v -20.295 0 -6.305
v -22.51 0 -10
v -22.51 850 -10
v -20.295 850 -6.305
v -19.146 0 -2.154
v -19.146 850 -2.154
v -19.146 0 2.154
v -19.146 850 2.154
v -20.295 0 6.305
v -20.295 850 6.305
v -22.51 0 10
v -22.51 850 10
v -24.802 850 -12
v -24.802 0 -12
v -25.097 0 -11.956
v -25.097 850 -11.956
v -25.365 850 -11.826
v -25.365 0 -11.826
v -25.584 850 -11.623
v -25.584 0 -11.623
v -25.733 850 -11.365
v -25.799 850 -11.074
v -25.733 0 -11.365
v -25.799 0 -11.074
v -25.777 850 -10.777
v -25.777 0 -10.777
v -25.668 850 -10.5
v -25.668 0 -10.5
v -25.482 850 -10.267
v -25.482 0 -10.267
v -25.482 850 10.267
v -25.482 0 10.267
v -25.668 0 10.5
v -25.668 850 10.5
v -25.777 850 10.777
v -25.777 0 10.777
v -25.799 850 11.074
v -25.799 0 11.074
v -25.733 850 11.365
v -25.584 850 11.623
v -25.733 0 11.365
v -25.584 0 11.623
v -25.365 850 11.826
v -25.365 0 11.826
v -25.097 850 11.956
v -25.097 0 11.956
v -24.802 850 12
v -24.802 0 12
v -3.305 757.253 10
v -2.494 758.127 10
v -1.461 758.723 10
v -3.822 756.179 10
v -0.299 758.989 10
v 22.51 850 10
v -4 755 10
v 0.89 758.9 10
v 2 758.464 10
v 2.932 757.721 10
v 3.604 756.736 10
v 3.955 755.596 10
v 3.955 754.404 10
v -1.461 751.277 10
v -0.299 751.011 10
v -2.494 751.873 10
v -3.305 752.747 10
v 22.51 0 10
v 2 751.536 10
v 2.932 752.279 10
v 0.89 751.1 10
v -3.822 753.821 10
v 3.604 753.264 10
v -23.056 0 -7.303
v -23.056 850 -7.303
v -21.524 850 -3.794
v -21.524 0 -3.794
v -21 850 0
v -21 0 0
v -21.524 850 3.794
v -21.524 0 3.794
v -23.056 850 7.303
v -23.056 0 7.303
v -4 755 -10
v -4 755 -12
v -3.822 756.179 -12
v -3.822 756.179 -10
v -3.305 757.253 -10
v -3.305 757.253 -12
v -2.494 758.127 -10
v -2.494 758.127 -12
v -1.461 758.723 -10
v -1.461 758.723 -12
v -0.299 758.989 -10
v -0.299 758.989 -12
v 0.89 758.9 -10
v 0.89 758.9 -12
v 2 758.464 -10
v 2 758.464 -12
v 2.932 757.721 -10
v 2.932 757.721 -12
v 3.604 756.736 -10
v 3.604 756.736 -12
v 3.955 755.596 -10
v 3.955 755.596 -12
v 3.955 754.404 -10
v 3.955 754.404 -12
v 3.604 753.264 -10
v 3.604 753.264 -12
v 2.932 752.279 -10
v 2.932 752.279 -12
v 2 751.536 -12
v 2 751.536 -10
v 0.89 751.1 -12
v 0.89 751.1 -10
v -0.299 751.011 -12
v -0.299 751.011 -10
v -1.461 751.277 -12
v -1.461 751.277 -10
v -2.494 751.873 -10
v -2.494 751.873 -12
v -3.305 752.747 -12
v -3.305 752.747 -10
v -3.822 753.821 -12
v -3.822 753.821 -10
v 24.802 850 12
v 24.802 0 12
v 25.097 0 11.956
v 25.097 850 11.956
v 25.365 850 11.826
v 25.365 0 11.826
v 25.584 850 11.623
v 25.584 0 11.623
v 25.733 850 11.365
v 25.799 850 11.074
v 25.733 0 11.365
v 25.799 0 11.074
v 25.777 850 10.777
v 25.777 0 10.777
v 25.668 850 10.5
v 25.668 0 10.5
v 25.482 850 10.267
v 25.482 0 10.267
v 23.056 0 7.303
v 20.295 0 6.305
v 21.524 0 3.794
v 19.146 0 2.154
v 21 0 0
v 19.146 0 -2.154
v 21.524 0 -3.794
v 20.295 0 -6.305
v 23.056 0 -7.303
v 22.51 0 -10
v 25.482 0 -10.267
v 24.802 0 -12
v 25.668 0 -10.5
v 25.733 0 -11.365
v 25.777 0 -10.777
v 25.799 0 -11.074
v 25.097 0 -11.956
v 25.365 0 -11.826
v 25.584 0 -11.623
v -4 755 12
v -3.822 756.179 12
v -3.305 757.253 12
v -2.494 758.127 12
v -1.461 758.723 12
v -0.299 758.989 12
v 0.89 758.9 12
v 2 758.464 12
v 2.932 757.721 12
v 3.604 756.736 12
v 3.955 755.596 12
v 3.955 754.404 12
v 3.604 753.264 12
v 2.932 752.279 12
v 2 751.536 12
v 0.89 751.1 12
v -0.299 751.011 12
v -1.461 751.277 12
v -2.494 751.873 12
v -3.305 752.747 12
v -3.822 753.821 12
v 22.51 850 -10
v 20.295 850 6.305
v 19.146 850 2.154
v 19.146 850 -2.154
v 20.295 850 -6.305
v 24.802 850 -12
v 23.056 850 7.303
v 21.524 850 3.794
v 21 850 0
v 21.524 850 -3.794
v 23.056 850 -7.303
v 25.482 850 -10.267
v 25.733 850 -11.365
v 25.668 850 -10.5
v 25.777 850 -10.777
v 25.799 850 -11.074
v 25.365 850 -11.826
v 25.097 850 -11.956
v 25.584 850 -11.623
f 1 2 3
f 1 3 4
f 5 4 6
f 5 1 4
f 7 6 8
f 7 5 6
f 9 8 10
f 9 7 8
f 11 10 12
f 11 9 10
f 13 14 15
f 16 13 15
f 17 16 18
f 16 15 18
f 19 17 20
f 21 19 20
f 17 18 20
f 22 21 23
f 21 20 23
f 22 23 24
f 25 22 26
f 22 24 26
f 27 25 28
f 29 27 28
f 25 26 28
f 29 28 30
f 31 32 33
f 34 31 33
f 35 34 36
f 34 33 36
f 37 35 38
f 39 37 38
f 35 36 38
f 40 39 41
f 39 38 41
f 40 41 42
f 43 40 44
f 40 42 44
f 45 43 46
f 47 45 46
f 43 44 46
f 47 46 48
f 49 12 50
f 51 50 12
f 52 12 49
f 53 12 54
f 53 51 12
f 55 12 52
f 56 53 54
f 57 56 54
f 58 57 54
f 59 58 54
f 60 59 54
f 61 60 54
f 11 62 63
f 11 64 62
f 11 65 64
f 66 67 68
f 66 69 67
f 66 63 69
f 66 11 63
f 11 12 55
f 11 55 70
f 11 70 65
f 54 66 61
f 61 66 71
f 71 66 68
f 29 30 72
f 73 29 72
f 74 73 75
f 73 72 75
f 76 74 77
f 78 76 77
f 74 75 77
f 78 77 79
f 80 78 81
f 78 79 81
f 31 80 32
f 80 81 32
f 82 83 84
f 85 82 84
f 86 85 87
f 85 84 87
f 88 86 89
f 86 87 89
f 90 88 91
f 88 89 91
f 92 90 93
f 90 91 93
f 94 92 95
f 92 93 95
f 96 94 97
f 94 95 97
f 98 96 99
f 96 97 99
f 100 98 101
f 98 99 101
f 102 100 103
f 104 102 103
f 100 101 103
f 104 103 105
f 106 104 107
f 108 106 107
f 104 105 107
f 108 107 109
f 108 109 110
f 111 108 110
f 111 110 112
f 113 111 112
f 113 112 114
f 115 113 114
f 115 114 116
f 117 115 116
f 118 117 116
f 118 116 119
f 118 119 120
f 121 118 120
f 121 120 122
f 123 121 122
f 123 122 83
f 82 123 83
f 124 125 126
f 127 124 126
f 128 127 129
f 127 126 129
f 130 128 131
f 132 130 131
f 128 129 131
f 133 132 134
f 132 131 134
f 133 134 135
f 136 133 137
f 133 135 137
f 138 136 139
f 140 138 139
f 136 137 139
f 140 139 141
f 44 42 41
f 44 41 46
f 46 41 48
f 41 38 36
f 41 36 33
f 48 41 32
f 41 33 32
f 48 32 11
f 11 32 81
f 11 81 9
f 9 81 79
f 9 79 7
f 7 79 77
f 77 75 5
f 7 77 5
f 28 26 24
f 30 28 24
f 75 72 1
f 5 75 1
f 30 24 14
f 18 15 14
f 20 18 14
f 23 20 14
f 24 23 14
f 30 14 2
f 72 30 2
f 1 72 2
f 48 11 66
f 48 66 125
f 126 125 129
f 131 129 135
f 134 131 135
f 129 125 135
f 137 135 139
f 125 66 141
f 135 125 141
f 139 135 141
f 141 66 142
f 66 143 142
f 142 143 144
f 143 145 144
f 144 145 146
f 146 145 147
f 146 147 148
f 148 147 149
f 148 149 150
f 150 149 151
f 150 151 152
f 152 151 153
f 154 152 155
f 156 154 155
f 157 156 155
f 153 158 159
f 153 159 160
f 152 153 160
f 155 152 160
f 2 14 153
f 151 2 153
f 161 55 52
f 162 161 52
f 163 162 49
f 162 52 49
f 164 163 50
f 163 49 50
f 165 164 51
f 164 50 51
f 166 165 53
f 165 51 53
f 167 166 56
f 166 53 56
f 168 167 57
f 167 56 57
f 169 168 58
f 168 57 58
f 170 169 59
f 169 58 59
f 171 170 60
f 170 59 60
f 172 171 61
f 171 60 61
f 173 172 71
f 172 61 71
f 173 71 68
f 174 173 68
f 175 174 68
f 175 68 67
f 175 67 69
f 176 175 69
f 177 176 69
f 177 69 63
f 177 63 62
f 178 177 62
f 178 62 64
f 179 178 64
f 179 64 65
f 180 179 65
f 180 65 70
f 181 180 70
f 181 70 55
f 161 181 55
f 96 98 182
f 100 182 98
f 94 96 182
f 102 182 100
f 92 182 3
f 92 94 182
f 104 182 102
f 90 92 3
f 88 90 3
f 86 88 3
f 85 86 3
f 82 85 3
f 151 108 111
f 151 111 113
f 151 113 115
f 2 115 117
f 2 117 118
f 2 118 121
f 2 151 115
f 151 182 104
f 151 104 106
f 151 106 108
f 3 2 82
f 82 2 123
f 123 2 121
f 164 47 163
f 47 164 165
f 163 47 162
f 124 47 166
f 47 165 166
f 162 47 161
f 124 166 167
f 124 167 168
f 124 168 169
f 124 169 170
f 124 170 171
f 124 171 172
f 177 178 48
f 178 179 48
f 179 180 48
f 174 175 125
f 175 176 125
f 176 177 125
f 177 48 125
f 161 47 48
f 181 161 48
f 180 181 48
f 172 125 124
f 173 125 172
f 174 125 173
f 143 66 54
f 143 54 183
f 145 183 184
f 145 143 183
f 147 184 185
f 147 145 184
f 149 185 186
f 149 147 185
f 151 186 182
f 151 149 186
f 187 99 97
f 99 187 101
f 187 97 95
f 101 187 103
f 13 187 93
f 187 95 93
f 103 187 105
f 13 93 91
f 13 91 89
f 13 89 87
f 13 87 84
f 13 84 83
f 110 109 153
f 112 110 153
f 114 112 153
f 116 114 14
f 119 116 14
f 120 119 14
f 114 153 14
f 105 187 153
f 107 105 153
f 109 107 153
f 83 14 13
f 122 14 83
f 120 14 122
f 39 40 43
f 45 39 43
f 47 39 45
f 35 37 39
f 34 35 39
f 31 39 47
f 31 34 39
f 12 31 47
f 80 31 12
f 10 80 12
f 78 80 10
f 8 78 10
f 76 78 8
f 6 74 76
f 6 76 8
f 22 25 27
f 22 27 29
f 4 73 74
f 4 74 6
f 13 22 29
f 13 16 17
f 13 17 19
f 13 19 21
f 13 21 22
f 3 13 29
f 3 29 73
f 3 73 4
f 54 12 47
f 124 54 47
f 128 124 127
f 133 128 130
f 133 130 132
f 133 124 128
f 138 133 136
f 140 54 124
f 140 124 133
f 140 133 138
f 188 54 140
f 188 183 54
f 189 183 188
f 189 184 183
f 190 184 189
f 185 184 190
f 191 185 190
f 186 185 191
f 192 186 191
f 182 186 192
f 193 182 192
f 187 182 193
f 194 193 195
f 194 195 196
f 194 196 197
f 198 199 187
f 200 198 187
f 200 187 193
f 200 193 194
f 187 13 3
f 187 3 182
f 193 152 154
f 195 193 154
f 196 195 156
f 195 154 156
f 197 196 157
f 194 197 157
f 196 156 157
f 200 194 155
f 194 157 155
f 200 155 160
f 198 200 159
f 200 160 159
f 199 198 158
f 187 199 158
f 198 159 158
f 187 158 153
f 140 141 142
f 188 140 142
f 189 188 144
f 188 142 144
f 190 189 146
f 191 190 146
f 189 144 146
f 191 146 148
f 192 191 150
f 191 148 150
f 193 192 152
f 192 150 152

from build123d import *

# Parameters (mm, degrees)
BOSS_EXTRUDE1_DEPTH = 850
SHELL1_T            = -2
SKETCH2_R           = 4
CUT_EXTRUDE1_DEPTH  = 851.730122418


with BuildPart() as part:
    # Sketch1 → Boss-Extrude1 (new body)
    with BuildSketch(Plane(origin=(0, 0, 0), x_dir=(1, 0, 0), z_dir=(0, 1, 0))):
        with BuildLine():
            Line((-24.801960973, -12), (24.801960973, -12))
            ThreePointArc((24.801960973, -12), (25.732910309, -11.365148372), (25.481830241, -10.266666667))
            ThreePointArc((25.481830241, -10.266666667), (21, 0), (25.481830241, 10.266666667))
            ThreePointArc((25.481830241, 10.266666667), (25.732910309, 11.365148372), (24.801960973, 12))
            Line((24.801960973, 12), (-24.801960973, 12))
            ThreePointArc((-24.801960973, 12), (-25.732910309, 11.365148372), (-25.481830241, 10.266666667))
            ThreePointArc((-25.481830241, 10.266666667), (-21, 0), (-25.481830241, -10.266666667))
            ThreePointArc((-25.481830241, -10.266666667), (-25.732910309, -11.365148372), (-24.801960973, -12))
        make_face()
    extrude(amount=BOSS_EXTRUDE1_DEPTH)

    # Shell1
    shell1_openings = [part.faces().sort_by_distance(p)[0] for p in [
        (0, 850, 0),
        (0, 0, 0),
    ]]
    offset(amount=SHELL1_T, openings=shell1_openings, kind=Kind.INTERSECTION)

    # Sketch2 → Cut-Extrude1 (cut, through all)
    with BuildSketch(Plane(origin=(0, 0, -12), x_dir=(-1, 0, 0), z_dir=(0, 0, -1))):
        with Locations((0, 755)):
            Circle(SKETCH2_R)
    extrude(amount=-CUT_EXTRUDE1_DEPTH, mode=Mode.SUBTRACT)


solid = part.part
